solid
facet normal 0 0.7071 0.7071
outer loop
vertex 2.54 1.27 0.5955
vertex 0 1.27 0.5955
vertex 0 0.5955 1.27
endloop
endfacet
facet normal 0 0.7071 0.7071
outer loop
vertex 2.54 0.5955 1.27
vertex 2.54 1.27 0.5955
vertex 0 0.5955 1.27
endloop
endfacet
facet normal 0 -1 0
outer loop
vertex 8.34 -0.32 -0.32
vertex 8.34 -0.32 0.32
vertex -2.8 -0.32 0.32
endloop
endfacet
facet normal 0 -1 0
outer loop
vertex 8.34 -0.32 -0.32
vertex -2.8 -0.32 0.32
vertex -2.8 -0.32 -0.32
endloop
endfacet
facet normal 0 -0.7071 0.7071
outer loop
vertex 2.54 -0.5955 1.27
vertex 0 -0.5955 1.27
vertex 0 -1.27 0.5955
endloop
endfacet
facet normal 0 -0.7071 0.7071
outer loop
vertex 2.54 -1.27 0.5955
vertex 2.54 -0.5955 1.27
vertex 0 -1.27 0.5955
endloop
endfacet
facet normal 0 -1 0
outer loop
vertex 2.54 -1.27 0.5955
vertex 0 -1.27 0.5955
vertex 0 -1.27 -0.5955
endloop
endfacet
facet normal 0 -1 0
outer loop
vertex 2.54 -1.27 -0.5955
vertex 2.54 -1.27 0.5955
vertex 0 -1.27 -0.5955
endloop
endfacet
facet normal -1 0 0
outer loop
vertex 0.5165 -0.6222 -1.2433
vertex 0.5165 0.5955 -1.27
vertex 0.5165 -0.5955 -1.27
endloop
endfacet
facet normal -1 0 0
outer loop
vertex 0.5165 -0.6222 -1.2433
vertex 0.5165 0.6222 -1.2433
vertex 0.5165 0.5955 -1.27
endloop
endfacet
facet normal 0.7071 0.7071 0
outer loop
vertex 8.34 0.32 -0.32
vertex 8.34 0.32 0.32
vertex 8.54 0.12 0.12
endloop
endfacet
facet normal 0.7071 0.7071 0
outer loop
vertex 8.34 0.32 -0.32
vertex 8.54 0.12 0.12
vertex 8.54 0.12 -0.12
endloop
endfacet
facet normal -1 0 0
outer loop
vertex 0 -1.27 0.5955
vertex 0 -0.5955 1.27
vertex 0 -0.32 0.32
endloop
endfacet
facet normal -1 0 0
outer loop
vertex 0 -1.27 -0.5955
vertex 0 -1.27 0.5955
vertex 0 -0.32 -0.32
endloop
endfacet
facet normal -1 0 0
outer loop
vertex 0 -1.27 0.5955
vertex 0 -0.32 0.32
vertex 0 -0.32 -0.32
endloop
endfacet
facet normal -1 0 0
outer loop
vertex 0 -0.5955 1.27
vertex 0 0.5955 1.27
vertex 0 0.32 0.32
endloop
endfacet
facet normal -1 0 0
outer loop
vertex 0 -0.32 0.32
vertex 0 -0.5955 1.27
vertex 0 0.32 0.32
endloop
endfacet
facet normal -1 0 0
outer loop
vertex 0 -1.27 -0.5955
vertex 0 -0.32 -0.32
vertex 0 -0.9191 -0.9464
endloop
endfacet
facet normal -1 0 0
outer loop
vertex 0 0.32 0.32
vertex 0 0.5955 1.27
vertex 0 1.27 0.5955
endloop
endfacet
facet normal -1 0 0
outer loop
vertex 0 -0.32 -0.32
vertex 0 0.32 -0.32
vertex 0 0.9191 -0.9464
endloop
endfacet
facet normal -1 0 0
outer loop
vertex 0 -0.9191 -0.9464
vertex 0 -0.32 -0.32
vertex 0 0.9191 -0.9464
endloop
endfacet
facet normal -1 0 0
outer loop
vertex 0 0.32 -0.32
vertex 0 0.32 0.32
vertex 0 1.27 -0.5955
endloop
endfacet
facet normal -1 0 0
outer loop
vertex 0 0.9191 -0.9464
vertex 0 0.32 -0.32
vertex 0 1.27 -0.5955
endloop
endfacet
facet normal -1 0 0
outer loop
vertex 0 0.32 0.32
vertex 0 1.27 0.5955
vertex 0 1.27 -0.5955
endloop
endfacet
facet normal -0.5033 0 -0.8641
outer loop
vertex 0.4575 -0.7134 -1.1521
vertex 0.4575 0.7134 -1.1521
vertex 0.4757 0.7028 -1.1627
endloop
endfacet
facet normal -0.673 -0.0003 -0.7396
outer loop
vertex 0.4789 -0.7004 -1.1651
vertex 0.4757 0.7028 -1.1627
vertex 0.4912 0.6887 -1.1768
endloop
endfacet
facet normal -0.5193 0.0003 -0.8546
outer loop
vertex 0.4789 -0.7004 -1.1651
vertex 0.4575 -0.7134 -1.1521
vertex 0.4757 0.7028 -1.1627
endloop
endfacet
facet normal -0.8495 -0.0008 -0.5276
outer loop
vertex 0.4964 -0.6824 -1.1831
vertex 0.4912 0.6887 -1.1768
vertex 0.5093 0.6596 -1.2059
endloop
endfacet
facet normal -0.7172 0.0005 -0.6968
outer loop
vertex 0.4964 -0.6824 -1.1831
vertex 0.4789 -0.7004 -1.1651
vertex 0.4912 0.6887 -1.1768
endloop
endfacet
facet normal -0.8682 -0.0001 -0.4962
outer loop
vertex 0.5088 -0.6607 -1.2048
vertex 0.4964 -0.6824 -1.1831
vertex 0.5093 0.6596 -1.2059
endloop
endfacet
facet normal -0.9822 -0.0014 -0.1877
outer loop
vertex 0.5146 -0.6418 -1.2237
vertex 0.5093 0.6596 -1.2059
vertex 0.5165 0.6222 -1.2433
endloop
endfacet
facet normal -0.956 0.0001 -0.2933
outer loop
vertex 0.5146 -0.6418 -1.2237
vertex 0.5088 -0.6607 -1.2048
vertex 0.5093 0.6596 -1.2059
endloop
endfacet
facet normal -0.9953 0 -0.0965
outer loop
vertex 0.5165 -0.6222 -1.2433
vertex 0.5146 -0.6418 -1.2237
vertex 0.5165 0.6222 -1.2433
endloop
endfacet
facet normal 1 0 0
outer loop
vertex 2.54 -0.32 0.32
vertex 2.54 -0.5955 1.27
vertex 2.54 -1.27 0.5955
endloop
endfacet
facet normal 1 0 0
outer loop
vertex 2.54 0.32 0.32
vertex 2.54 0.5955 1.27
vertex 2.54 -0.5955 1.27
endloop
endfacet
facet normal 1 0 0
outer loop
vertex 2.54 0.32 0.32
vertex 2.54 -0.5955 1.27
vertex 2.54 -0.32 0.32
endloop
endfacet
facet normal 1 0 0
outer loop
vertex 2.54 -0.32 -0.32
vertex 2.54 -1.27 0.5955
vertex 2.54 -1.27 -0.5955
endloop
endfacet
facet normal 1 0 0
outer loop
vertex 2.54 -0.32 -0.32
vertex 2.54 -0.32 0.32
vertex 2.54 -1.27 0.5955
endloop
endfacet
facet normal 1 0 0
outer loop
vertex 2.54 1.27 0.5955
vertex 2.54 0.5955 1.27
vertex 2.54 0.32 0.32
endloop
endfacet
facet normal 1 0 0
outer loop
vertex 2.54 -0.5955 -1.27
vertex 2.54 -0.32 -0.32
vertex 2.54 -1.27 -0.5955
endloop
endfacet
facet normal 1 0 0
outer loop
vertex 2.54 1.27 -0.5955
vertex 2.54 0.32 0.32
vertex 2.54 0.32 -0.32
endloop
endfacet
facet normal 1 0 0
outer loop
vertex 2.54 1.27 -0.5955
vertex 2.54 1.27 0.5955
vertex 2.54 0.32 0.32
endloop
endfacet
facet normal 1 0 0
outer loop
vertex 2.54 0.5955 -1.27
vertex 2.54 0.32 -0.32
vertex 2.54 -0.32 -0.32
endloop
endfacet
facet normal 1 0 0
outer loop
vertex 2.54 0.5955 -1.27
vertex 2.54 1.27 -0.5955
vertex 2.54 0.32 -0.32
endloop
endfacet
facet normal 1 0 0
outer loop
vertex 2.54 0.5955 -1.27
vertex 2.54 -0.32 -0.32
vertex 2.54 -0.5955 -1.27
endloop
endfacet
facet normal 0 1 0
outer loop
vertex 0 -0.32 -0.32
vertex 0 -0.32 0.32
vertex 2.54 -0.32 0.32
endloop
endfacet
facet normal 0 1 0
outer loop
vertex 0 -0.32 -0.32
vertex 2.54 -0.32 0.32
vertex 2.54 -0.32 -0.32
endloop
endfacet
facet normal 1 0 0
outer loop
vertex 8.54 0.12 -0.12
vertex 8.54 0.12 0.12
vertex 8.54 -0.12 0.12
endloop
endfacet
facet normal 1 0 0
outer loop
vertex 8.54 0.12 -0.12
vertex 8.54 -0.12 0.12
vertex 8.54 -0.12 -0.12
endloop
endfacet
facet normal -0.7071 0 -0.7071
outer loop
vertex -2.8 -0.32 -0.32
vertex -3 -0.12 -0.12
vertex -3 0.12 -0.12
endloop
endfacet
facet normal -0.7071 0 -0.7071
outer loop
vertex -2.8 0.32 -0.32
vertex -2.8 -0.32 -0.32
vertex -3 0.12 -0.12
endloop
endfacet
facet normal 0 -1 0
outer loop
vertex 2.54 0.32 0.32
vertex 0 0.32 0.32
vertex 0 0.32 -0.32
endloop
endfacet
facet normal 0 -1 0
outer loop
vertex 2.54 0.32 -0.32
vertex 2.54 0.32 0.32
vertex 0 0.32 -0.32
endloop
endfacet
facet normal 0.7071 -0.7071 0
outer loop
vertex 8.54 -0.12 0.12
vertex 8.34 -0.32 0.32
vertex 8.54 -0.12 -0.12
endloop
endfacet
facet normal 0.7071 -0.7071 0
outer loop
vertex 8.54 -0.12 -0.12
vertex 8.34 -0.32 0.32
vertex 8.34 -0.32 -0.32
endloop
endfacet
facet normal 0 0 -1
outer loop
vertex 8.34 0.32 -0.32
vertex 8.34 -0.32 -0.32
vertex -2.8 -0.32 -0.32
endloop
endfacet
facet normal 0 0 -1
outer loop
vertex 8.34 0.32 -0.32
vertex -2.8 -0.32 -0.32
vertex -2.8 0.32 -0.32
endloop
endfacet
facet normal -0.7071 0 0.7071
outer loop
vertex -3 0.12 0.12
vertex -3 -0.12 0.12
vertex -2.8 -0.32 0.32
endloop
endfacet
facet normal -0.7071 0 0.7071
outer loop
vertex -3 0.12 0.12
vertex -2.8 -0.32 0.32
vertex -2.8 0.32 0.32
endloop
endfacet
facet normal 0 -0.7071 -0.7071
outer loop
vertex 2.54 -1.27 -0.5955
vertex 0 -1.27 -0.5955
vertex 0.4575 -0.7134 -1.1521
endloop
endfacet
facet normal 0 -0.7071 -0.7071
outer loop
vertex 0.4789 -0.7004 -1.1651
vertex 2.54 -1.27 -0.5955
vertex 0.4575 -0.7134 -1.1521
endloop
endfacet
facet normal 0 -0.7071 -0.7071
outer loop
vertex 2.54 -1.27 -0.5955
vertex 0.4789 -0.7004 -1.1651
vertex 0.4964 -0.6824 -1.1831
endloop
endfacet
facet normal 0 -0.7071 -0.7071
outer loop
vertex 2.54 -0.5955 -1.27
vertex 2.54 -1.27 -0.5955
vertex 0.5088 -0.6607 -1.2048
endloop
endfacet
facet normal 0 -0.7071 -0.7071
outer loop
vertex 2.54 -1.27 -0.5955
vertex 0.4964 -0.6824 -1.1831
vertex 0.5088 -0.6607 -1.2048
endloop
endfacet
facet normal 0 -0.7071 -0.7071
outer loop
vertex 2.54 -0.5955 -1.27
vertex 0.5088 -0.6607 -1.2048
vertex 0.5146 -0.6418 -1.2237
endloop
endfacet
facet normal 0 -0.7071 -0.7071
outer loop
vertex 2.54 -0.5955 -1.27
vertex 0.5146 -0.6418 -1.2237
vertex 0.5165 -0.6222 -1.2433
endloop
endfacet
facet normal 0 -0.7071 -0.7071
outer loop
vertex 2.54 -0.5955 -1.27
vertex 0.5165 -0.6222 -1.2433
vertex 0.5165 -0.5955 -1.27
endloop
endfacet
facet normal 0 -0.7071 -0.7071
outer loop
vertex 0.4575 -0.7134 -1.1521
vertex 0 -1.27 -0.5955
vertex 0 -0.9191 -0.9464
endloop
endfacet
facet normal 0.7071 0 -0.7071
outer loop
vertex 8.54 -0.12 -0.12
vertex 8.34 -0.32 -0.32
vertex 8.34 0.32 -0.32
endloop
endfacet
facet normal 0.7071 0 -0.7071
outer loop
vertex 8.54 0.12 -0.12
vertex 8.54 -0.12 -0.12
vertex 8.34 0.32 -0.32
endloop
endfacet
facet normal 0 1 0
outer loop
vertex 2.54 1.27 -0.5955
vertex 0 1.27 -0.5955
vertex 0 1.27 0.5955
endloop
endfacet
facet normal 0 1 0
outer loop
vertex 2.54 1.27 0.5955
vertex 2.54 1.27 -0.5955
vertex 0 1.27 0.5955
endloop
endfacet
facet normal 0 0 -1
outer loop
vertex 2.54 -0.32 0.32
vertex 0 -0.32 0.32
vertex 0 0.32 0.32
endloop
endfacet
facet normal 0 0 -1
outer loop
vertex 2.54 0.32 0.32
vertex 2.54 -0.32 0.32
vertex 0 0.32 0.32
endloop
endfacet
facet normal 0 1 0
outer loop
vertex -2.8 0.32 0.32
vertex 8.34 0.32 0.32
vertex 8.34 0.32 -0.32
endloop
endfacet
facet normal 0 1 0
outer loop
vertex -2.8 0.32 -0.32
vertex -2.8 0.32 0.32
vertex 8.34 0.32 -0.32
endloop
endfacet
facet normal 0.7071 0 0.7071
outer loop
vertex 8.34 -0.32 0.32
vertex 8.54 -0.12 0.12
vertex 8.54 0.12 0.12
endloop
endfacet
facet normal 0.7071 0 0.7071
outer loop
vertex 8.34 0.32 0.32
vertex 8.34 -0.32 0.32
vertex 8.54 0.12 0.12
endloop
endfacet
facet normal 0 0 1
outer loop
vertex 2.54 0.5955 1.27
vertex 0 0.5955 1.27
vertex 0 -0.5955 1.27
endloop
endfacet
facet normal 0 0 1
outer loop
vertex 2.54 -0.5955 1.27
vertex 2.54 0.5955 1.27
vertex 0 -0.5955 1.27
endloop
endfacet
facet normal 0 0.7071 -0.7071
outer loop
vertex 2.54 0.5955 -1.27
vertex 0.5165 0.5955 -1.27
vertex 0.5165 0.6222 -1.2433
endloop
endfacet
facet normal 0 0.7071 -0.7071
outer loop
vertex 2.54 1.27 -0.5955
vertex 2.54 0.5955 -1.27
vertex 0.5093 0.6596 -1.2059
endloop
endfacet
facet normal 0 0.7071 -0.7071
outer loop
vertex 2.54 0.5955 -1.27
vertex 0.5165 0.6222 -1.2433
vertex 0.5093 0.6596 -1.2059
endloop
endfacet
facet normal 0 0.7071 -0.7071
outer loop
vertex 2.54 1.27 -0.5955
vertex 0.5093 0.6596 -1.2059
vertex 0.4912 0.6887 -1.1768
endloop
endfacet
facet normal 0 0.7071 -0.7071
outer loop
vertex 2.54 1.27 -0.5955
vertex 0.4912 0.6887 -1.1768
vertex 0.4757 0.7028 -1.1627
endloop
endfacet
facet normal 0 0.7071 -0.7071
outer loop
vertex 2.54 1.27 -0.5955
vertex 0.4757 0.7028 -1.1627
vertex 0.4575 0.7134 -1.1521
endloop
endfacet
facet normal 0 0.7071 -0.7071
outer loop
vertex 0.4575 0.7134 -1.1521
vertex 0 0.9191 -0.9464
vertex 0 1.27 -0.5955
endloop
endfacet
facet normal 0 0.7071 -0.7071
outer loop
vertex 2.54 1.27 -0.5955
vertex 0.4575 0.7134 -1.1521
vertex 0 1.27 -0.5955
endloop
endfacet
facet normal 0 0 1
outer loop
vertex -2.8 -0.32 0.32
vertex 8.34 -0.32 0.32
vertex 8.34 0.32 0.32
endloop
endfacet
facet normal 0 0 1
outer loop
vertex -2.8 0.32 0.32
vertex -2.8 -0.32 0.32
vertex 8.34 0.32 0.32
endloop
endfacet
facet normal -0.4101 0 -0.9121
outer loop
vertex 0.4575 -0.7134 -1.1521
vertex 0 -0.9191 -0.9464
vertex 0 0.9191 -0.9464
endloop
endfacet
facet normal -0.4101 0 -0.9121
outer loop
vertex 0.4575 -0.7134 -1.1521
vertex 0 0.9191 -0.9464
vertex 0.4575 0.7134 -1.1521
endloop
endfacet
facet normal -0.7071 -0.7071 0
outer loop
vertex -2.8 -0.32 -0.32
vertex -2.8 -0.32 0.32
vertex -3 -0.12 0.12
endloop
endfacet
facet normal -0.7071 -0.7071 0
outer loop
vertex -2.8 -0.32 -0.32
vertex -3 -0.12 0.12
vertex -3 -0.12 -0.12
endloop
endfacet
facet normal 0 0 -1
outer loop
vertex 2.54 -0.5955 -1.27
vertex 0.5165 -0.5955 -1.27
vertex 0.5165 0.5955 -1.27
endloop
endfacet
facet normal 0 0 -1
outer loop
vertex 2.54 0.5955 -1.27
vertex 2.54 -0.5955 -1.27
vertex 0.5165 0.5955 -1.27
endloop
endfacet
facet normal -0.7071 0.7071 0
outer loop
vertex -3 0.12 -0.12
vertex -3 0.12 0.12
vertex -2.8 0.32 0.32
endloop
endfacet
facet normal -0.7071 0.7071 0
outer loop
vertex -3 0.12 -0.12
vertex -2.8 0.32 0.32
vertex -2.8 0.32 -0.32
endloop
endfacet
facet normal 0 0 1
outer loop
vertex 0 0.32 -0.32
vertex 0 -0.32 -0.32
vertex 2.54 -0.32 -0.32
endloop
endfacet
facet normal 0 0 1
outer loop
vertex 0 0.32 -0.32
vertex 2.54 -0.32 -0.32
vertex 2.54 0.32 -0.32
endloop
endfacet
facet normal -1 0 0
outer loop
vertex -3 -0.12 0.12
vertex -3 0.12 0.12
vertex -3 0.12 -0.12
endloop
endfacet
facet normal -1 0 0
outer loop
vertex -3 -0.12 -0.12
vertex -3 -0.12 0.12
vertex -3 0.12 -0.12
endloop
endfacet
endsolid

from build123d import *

# Parameters (mm, degrees)
CROQUIS1_W                   = 0.64
CROQUIS1_H                   = 0.64
SALIENTE_EXTRUIR1_DEPTH      = 2.54
CORTAR_EXTRUIR1_DEPTH        = 2.54
CORTAR_EXTRUIR1_DEPTH_BACK   = 2.54
CROQUIS3_W                   = 0.64
CROQUIS3_H                   = 0.64
SALIENTE_EXTRUIR2_DEPTH      = 8.54
SALIENTE_EXTRUIR2_DEPTH_BACK = 3
CHAFL_N1_SIZE                = 0.2


with BuildPart() as part:
    # Croquis1 → Saliente-Extruir1 (new body)
    with BuildSketch(Plane(origin=(0, 0, 0), x_dir=(0, 0, -1), z_dir=(1, 0, 0))):
        Polygon((-0.595482683, 1.27), (-1.27, 0.595482683), (-1.27, -0.595482683), (-0.595482683, -1.27), (0.595482683, -1.27), (1.27, -0.595482683), (1.27, 0.595482683), (0.595482683, 1.27), align=None)
        Rectangle(CROQUIS1_W, CROQUIS1_H, mode=Mode.SUBTRACT)
    extrude(amount=SALIENTE_EXTRUIR1_DEPTH)

    # Croquis2 → Cortar-Extruir1 (cut, two sides)
    with BuildSketch(Plane(origin=(0, 0, 0), x_dir=(1, 0, 0), z_dir=(0, 1, 0))) as cortar_extruir1_sk:
        with BuildLine():
            Line((0.516526244, 1.243275937), (0.516526244, 1.296724063))
            ThreePointArc((0.516526244, 1.296724063), (0.500491193, 1.351036929), (0.457528496, 1.387931603))
            Line((0.457528496, 1.387931603), (0, 1.593613049))
            Line((0, 1.593613049), (0, 0.946386951))
            Line((0, 0.946386951), (0.457528496, 1.152068397))
            ThreePointArc((0.457528496, 1.152068397), (0.500491193, 1.188963071), (0.516526244, 1.243275937))
        make_face()
    extrude(amount=CORTAR_EXTRUIR1_DEPTH, mode=Mode.SUBTRACT)
    extrude(cortar_extruir1_sk.sketch, amount=-CORTAR_EXTRUIR1_DEPTH_BACK, mode=Mode.SUBTRACT)


with BuildPart() as body_2:
    # Croquis3 → Saliente-Extruir2 (new body, two sides)
    with BuildSketch(Plane(origin=(0, 0, 0), x_dir=(0, 0, -1), z_dir=(1, 0, 0))) as saliente_extruir2_sk:
        Rectangle(CROQUIS3_W, CROQUIS3_H)
    extrude(amount=SALIENTE_EXTRUIR2_DEPTH)
    extrude(saliente_extruir2_sk.sketch, amount=-SALIENTE_EXTRUIR2_DEPTH_BACK)

    # Chaflán1
    chafl_n1_edges = [body_2.edges().sort_by_distance(p)[0] for p in [
        (-3, 0, -0.32),
        (8.54, 0, 0.32),
        (8.54, -0.32, 0),
        (-3, 0.32, 0),
        (8.54, 0, -0.32),
        (8.54, 0.32, 0),
        (-3, 0, 0.32),
        (-3, -0.32, 0),
    ]]
    chamfer(chafl_n1_edges, length=CHAFL_N1_SIZE)


solid = Compound([part.part, body_2.part])
